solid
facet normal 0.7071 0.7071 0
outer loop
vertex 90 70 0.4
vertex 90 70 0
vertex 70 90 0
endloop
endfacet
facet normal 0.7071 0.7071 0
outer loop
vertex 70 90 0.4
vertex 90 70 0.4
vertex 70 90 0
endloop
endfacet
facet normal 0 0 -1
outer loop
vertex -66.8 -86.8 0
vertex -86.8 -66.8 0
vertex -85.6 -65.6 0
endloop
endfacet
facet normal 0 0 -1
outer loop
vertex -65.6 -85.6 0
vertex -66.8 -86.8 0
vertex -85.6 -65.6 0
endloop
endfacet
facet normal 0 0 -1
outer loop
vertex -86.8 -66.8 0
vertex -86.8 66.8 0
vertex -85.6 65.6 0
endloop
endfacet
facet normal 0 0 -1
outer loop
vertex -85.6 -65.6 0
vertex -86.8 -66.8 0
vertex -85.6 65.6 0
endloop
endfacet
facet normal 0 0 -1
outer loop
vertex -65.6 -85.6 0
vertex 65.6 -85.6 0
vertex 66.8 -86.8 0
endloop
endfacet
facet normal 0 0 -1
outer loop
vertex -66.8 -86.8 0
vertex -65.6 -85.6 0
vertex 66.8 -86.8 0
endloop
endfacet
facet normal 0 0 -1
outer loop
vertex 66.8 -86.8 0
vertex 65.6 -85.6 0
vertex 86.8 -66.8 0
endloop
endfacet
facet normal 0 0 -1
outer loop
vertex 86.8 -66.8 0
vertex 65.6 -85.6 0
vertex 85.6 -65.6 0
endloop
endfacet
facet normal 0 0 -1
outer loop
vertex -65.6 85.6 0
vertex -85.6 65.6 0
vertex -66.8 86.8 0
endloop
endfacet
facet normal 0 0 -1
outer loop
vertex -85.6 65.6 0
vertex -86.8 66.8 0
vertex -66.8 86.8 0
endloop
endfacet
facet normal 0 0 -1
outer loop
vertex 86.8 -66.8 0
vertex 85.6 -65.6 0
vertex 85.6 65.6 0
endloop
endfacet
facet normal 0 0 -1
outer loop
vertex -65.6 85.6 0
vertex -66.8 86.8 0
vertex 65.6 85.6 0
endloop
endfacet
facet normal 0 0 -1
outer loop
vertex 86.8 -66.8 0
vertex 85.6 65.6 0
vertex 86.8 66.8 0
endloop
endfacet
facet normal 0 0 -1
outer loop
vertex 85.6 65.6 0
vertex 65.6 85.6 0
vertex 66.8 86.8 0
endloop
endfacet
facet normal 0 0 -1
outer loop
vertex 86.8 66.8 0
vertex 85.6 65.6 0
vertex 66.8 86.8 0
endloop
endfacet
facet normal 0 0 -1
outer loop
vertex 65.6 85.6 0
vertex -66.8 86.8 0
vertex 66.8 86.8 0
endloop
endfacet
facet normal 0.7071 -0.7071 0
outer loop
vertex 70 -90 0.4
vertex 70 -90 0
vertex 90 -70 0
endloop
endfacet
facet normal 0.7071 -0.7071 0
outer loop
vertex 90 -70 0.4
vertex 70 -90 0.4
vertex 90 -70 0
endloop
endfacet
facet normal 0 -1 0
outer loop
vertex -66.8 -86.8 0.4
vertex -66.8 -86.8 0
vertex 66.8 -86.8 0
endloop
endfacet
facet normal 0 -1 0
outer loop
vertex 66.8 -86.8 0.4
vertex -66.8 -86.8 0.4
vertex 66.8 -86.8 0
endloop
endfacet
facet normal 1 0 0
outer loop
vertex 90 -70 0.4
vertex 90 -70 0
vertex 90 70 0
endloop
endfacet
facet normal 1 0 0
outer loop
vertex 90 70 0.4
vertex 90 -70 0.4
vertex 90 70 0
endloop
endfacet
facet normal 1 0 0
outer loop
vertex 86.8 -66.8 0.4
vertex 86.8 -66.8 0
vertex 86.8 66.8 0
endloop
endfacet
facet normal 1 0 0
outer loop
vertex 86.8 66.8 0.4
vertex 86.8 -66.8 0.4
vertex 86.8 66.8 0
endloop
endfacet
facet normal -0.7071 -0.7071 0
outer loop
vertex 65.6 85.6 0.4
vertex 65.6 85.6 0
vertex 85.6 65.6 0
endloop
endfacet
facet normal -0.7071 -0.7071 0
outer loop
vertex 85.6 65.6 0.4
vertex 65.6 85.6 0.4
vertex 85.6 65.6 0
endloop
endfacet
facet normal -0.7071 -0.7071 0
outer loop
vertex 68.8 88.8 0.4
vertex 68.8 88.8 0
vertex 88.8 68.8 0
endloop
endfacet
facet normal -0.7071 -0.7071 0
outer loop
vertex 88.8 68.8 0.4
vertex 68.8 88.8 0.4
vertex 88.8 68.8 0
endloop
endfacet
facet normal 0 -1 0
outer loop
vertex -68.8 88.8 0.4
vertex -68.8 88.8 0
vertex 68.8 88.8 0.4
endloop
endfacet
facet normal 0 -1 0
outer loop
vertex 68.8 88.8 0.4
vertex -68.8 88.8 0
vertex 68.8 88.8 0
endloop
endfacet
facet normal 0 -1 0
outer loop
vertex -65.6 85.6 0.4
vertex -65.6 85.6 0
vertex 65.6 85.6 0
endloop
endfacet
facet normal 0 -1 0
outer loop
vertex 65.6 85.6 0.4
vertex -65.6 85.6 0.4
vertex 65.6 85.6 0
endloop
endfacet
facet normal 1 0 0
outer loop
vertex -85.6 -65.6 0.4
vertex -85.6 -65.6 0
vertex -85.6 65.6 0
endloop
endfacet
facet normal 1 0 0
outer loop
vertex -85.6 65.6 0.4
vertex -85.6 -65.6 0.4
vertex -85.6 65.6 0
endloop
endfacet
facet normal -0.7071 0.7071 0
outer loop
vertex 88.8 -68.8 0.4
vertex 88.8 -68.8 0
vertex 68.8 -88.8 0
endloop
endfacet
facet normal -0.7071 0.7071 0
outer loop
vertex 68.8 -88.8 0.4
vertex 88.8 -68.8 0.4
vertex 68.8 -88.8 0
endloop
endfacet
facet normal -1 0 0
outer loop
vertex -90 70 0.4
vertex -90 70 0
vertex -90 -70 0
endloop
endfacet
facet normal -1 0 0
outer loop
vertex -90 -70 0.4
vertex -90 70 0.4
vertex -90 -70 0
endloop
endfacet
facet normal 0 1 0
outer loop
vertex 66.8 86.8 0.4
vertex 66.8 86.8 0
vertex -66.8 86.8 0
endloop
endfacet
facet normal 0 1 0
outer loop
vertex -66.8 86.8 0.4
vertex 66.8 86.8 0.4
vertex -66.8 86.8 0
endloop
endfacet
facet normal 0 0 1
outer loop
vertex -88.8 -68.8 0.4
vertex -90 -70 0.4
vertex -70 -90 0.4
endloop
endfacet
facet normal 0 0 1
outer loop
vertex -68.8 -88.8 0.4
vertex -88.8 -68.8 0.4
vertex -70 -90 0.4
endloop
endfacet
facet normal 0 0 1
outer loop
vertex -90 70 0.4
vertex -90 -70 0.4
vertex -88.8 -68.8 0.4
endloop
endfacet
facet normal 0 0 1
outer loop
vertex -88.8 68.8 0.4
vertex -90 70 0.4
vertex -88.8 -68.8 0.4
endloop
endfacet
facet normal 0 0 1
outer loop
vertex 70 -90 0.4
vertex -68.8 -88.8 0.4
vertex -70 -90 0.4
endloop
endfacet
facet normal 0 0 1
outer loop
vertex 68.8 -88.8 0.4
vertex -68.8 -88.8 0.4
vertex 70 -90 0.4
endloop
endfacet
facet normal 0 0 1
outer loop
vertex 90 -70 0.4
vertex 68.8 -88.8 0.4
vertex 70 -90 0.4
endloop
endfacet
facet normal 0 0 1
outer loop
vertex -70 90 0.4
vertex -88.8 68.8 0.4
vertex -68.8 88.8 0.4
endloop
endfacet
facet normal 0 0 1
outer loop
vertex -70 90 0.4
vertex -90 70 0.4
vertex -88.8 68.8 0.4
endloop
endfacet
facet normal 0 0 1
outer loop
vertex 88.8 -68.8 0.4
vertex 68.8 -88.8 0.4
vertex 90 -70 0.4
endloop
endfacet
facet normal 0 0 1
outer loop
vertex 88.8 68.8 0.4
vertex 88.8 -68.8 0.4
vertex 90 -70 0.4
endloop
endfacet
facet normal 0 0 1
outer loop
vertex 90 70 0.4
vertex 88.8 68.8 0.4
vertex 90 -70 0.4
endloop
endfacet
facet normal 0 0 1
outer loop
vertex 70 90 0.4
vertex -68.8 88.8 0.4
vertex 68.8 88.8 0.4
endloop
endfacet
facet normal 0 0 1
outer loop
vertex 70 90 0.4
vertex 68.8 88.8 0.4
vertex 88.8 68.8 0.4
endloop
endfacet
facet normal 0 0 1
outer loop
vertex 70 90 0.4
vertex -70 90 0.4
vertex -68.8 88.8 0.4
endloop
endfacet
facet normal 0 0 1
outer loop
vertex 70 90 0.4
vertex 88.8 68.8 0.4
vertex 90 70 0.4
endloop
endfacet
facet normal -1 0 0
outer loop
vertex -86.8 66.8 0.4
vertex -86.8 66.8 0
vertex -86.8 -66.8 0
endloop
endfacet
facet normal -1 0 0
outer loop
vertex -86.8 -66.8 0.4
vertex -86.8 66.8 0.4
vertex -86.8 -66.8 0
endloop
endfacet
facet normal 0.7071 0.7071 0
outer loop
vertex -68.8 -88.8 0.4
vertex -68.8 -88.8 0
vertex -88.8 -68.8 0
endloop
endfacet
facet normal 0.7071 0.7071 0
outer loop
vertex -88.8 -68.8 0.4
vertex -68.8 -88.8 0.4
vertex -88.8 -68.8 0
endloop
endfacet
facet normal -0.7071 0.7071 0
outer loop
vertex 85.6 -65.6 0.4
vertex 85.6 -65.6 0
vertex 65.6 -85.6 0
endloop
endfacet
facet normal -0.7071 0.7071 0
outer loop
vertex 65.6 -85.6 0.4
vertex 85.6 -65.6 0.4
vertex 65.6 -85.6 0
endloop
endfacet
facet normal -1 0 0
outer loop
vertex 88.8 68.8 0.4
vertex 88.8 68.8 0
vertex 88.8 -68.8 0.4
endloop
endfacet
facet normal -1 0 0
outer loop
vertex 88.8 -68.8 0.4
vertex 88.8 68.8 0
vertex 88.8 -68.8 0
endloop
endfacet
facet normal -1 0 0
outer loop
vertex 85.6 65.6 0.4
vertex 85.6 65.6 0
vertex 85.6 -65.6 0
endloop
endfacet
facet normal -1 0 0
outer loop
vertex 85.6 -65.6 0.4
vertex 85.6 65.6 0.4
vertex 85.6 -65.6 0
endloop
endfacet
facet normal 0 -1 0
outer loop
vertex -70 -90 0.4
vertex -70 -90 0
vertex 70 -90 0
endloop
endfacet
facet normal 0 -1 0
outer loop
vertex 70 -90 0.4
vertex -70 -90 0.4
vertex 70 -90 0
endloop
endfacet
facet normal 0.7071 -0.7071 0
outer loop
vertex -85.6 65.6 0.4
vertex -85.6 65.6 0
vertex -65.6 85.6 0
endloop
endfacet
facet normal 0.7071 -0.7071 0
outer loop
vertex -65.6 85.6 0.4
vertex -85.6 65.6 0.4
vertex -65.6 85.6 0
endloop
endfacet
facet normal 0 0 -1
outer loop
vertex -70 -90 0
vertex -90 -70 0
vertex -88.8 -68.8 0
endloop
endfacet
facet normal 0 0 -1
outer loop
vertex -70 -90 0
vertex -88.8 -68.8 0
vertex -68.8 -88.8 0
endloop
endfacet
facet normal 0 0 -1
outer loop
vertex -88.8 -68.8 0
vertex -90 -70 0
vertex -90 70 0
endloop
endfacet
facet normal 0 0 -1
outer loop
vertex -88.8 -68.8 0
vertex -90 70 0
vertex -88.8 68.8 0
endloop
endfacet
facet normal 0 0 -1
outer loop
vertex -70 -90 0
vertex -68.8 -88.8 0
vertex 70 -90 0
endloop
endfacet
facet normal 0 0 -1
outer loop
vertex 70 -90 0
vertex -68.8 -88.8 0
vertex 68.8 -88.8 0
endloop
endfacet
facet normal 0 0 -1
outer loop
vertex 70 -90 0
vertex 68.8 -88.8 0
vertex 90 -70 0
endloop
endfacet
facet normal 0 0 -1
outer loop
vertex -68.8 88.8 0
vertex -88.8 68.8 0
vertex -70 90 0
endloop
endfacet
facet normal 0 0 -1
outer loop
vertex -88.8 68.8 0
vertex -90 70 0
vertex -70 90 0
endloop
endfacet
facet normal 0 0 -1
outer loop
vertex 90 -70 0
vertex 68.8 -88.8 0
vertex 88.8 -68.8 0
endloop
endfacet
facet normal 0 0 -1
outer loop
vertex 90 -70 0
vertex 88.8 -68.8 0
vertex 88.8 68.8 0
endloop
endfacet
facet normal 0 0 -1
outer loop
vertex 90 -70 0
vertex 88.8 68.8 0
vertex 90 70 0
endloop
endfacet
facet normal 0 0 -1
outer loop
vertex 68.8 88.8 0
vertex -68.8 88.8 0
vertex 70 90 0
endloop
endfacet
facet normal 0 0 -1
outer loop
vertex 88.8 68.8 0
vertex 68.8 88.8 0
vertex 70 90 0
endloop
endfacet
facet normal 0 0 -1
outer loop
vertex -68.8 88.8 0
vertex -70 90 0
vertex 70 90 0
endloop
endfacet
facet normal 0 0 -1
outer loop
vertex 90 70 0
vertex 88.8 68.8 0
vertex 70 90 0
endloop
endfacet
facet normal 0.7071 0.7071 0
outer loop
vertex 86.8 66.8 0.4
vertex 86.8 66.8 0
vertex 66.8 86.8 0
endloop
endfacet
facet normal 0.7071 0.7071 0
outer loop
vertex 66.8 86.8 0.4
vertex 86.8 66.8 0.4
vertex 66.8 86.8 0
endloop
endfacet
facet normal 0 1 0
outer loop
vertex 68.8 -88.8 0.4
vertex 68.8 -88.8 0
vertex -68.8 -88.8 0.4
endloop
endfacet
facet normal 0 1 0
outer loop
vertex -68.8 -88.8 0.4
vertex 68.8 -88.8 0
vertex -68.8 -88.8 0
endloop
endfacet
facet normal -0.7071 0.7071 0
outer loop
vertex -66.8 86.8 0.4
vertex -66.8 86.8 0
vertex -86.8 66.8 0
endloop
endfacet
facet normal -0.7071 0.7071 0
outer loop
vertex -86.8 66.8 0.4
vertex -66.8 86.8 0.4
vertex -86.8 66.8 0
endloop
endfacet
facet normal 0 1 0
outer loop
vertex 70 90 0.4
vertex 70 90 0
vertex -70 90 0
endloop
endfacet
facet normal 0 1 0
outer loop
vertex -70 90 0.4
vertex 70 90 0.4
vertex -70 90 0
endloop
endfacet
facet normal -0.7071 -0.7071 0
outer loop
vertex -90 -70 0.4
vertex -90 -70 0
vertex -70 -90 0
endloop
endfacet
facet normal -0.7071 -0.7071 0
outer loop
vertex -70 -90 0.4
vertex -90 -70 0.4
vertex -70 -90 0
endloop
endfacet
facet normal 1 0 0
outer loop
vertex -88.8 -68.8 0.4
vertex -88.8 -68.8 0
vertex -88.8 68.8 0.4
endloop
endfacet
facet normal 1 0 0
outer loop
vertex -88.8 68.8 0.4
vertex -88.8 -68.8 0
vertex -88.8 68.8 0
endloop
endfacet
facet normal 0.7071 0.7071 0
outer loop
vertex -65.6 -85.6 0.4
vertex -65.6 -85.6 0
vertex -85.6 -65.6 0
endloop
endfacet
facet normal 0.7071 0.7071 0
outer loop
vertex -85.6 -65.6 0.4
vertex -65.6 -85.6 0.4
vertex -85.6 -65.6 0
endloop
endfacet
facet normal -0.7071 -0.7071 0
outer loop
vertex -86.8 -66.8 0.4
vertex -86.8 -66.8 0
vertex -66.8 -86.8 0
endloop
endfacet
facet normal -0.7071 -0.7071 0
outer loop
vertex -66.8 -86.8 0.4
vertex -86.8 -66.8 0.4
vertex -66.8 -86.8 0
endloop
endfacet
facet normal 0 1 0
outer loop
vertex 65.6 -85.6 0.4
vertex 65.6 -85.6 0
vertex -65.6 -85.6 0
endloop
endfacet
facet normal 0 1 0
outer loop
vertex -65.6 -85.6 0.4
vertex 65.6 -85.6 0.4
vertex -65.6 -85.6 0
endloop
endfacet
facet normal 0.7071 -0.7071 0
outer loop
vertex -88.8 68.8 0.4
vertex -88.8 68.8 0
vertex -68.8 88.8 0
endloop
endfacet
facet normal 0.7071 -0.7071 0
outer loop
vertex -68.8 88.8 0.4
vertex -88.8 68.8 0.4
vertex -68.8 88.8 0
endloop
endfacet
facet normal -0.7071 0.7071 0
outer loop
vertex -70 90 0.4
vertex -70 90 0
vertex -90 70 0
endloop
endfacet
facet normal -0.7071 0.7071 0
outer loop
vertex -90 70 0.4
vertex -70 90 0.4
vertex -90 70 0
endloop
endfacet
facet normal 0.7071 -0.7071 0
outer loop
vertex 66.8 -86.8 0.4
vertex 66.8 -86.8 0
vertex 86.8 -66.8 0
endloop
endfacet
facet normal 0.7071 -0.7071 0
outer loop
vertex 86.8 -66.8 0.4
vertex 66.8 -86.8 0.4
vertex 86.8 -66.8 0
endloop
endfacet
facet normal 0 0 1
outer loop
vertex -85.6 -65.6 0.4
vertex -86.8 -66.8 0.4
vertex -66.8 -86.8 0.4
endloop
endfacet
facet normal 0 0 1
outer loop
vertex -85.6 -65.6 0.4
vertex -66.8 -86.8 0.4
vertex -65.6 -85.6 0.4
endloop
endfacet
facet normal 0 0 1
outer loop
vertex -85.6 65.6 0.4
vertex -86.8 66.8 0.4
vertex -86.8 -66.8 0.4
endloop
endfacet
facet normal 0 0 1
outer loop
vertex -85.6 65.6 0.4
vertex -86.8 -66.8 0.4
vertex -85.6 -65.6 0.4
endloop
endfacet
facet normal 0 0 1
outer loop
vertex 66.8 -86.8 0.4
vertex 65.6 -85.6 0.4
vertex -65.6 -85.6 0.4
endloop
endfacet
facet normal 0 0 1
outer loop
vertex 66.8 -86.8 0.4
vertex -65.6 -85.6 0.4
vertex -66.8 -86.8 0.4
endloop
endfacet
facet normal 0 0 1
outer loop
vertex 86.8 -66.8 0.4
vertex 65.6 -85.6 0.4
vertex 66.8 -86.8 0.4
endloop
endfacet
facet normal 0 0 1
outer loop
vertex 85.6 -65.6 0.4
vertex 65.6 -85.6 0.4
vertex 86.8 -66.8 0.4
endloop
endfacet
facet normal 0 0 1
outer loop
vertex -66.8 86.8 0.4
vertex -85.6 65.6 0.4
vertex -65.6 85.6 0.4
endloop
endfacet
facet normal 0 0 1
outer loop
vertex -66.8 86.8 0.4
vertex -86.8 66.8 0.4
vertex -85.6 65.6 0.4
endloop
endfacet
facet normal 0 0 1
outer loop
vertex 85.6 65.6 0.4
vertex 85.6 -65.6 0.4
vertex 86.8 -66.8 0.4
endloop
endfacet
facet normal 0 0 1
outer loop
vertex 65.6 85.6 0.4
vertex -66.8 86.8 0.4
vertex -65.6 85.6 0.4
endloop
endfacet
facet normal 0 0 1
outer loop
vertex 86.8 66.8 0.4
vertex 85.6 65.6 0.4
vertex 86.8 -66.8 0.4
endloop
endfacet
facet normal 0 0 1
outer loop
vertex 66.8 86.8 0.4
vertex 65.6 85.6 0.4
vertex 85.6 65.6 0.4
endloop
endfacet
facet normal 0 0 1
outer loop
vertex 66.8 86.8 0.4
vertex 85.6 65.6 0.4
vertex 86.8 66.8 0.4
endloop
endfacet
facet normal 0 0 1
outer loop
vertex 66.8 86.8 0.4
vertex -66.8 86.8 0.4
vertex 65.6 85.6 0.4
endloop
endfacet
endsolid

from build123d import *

# Parameters (mm, degrees)
F1_DEPTH = 0.4


with BuildPart() as f1:
    # F0 (on Top) → F1 (new body)
    with BuildSketch(Plane.XY):
        Polygon((90, 70), (70, 90), (-70, 90), (-90, 70), (-90, -70), (-70, -90), (70, -90), (90, -70), align=None)
        Polygon((-68.8, 88.8), (68.8, 88.8), (88.8, 68.8), (88.8, -68.8), (68.8, -88.8), (-68.8, -88.8), (-88.8, -68.8), (-88.8, 68.8), align=None, mode=Mode.SUBTRACT)
        Polygon((-86.8, -66.8), (-66.8, -86.8), (66.8, -86.8), (86.8, -66.8), (86.8, 66.8), (66.8, 86.8), (-66.8, 86.8), (-86.8, 66.8), align=None)
        Polygon((65.6, -85.6), (-65.6, -85.6), (-85.6, -65.6), (-85.6, 65.6), (-65.6, 85.6), (65.6, 85.6), (85.6, 65.6), (85.6, -65.6), align=None, mode=Mode.SUBTRACT)
    extrude(amount=F1_DEPTH)


solid = f1.part
